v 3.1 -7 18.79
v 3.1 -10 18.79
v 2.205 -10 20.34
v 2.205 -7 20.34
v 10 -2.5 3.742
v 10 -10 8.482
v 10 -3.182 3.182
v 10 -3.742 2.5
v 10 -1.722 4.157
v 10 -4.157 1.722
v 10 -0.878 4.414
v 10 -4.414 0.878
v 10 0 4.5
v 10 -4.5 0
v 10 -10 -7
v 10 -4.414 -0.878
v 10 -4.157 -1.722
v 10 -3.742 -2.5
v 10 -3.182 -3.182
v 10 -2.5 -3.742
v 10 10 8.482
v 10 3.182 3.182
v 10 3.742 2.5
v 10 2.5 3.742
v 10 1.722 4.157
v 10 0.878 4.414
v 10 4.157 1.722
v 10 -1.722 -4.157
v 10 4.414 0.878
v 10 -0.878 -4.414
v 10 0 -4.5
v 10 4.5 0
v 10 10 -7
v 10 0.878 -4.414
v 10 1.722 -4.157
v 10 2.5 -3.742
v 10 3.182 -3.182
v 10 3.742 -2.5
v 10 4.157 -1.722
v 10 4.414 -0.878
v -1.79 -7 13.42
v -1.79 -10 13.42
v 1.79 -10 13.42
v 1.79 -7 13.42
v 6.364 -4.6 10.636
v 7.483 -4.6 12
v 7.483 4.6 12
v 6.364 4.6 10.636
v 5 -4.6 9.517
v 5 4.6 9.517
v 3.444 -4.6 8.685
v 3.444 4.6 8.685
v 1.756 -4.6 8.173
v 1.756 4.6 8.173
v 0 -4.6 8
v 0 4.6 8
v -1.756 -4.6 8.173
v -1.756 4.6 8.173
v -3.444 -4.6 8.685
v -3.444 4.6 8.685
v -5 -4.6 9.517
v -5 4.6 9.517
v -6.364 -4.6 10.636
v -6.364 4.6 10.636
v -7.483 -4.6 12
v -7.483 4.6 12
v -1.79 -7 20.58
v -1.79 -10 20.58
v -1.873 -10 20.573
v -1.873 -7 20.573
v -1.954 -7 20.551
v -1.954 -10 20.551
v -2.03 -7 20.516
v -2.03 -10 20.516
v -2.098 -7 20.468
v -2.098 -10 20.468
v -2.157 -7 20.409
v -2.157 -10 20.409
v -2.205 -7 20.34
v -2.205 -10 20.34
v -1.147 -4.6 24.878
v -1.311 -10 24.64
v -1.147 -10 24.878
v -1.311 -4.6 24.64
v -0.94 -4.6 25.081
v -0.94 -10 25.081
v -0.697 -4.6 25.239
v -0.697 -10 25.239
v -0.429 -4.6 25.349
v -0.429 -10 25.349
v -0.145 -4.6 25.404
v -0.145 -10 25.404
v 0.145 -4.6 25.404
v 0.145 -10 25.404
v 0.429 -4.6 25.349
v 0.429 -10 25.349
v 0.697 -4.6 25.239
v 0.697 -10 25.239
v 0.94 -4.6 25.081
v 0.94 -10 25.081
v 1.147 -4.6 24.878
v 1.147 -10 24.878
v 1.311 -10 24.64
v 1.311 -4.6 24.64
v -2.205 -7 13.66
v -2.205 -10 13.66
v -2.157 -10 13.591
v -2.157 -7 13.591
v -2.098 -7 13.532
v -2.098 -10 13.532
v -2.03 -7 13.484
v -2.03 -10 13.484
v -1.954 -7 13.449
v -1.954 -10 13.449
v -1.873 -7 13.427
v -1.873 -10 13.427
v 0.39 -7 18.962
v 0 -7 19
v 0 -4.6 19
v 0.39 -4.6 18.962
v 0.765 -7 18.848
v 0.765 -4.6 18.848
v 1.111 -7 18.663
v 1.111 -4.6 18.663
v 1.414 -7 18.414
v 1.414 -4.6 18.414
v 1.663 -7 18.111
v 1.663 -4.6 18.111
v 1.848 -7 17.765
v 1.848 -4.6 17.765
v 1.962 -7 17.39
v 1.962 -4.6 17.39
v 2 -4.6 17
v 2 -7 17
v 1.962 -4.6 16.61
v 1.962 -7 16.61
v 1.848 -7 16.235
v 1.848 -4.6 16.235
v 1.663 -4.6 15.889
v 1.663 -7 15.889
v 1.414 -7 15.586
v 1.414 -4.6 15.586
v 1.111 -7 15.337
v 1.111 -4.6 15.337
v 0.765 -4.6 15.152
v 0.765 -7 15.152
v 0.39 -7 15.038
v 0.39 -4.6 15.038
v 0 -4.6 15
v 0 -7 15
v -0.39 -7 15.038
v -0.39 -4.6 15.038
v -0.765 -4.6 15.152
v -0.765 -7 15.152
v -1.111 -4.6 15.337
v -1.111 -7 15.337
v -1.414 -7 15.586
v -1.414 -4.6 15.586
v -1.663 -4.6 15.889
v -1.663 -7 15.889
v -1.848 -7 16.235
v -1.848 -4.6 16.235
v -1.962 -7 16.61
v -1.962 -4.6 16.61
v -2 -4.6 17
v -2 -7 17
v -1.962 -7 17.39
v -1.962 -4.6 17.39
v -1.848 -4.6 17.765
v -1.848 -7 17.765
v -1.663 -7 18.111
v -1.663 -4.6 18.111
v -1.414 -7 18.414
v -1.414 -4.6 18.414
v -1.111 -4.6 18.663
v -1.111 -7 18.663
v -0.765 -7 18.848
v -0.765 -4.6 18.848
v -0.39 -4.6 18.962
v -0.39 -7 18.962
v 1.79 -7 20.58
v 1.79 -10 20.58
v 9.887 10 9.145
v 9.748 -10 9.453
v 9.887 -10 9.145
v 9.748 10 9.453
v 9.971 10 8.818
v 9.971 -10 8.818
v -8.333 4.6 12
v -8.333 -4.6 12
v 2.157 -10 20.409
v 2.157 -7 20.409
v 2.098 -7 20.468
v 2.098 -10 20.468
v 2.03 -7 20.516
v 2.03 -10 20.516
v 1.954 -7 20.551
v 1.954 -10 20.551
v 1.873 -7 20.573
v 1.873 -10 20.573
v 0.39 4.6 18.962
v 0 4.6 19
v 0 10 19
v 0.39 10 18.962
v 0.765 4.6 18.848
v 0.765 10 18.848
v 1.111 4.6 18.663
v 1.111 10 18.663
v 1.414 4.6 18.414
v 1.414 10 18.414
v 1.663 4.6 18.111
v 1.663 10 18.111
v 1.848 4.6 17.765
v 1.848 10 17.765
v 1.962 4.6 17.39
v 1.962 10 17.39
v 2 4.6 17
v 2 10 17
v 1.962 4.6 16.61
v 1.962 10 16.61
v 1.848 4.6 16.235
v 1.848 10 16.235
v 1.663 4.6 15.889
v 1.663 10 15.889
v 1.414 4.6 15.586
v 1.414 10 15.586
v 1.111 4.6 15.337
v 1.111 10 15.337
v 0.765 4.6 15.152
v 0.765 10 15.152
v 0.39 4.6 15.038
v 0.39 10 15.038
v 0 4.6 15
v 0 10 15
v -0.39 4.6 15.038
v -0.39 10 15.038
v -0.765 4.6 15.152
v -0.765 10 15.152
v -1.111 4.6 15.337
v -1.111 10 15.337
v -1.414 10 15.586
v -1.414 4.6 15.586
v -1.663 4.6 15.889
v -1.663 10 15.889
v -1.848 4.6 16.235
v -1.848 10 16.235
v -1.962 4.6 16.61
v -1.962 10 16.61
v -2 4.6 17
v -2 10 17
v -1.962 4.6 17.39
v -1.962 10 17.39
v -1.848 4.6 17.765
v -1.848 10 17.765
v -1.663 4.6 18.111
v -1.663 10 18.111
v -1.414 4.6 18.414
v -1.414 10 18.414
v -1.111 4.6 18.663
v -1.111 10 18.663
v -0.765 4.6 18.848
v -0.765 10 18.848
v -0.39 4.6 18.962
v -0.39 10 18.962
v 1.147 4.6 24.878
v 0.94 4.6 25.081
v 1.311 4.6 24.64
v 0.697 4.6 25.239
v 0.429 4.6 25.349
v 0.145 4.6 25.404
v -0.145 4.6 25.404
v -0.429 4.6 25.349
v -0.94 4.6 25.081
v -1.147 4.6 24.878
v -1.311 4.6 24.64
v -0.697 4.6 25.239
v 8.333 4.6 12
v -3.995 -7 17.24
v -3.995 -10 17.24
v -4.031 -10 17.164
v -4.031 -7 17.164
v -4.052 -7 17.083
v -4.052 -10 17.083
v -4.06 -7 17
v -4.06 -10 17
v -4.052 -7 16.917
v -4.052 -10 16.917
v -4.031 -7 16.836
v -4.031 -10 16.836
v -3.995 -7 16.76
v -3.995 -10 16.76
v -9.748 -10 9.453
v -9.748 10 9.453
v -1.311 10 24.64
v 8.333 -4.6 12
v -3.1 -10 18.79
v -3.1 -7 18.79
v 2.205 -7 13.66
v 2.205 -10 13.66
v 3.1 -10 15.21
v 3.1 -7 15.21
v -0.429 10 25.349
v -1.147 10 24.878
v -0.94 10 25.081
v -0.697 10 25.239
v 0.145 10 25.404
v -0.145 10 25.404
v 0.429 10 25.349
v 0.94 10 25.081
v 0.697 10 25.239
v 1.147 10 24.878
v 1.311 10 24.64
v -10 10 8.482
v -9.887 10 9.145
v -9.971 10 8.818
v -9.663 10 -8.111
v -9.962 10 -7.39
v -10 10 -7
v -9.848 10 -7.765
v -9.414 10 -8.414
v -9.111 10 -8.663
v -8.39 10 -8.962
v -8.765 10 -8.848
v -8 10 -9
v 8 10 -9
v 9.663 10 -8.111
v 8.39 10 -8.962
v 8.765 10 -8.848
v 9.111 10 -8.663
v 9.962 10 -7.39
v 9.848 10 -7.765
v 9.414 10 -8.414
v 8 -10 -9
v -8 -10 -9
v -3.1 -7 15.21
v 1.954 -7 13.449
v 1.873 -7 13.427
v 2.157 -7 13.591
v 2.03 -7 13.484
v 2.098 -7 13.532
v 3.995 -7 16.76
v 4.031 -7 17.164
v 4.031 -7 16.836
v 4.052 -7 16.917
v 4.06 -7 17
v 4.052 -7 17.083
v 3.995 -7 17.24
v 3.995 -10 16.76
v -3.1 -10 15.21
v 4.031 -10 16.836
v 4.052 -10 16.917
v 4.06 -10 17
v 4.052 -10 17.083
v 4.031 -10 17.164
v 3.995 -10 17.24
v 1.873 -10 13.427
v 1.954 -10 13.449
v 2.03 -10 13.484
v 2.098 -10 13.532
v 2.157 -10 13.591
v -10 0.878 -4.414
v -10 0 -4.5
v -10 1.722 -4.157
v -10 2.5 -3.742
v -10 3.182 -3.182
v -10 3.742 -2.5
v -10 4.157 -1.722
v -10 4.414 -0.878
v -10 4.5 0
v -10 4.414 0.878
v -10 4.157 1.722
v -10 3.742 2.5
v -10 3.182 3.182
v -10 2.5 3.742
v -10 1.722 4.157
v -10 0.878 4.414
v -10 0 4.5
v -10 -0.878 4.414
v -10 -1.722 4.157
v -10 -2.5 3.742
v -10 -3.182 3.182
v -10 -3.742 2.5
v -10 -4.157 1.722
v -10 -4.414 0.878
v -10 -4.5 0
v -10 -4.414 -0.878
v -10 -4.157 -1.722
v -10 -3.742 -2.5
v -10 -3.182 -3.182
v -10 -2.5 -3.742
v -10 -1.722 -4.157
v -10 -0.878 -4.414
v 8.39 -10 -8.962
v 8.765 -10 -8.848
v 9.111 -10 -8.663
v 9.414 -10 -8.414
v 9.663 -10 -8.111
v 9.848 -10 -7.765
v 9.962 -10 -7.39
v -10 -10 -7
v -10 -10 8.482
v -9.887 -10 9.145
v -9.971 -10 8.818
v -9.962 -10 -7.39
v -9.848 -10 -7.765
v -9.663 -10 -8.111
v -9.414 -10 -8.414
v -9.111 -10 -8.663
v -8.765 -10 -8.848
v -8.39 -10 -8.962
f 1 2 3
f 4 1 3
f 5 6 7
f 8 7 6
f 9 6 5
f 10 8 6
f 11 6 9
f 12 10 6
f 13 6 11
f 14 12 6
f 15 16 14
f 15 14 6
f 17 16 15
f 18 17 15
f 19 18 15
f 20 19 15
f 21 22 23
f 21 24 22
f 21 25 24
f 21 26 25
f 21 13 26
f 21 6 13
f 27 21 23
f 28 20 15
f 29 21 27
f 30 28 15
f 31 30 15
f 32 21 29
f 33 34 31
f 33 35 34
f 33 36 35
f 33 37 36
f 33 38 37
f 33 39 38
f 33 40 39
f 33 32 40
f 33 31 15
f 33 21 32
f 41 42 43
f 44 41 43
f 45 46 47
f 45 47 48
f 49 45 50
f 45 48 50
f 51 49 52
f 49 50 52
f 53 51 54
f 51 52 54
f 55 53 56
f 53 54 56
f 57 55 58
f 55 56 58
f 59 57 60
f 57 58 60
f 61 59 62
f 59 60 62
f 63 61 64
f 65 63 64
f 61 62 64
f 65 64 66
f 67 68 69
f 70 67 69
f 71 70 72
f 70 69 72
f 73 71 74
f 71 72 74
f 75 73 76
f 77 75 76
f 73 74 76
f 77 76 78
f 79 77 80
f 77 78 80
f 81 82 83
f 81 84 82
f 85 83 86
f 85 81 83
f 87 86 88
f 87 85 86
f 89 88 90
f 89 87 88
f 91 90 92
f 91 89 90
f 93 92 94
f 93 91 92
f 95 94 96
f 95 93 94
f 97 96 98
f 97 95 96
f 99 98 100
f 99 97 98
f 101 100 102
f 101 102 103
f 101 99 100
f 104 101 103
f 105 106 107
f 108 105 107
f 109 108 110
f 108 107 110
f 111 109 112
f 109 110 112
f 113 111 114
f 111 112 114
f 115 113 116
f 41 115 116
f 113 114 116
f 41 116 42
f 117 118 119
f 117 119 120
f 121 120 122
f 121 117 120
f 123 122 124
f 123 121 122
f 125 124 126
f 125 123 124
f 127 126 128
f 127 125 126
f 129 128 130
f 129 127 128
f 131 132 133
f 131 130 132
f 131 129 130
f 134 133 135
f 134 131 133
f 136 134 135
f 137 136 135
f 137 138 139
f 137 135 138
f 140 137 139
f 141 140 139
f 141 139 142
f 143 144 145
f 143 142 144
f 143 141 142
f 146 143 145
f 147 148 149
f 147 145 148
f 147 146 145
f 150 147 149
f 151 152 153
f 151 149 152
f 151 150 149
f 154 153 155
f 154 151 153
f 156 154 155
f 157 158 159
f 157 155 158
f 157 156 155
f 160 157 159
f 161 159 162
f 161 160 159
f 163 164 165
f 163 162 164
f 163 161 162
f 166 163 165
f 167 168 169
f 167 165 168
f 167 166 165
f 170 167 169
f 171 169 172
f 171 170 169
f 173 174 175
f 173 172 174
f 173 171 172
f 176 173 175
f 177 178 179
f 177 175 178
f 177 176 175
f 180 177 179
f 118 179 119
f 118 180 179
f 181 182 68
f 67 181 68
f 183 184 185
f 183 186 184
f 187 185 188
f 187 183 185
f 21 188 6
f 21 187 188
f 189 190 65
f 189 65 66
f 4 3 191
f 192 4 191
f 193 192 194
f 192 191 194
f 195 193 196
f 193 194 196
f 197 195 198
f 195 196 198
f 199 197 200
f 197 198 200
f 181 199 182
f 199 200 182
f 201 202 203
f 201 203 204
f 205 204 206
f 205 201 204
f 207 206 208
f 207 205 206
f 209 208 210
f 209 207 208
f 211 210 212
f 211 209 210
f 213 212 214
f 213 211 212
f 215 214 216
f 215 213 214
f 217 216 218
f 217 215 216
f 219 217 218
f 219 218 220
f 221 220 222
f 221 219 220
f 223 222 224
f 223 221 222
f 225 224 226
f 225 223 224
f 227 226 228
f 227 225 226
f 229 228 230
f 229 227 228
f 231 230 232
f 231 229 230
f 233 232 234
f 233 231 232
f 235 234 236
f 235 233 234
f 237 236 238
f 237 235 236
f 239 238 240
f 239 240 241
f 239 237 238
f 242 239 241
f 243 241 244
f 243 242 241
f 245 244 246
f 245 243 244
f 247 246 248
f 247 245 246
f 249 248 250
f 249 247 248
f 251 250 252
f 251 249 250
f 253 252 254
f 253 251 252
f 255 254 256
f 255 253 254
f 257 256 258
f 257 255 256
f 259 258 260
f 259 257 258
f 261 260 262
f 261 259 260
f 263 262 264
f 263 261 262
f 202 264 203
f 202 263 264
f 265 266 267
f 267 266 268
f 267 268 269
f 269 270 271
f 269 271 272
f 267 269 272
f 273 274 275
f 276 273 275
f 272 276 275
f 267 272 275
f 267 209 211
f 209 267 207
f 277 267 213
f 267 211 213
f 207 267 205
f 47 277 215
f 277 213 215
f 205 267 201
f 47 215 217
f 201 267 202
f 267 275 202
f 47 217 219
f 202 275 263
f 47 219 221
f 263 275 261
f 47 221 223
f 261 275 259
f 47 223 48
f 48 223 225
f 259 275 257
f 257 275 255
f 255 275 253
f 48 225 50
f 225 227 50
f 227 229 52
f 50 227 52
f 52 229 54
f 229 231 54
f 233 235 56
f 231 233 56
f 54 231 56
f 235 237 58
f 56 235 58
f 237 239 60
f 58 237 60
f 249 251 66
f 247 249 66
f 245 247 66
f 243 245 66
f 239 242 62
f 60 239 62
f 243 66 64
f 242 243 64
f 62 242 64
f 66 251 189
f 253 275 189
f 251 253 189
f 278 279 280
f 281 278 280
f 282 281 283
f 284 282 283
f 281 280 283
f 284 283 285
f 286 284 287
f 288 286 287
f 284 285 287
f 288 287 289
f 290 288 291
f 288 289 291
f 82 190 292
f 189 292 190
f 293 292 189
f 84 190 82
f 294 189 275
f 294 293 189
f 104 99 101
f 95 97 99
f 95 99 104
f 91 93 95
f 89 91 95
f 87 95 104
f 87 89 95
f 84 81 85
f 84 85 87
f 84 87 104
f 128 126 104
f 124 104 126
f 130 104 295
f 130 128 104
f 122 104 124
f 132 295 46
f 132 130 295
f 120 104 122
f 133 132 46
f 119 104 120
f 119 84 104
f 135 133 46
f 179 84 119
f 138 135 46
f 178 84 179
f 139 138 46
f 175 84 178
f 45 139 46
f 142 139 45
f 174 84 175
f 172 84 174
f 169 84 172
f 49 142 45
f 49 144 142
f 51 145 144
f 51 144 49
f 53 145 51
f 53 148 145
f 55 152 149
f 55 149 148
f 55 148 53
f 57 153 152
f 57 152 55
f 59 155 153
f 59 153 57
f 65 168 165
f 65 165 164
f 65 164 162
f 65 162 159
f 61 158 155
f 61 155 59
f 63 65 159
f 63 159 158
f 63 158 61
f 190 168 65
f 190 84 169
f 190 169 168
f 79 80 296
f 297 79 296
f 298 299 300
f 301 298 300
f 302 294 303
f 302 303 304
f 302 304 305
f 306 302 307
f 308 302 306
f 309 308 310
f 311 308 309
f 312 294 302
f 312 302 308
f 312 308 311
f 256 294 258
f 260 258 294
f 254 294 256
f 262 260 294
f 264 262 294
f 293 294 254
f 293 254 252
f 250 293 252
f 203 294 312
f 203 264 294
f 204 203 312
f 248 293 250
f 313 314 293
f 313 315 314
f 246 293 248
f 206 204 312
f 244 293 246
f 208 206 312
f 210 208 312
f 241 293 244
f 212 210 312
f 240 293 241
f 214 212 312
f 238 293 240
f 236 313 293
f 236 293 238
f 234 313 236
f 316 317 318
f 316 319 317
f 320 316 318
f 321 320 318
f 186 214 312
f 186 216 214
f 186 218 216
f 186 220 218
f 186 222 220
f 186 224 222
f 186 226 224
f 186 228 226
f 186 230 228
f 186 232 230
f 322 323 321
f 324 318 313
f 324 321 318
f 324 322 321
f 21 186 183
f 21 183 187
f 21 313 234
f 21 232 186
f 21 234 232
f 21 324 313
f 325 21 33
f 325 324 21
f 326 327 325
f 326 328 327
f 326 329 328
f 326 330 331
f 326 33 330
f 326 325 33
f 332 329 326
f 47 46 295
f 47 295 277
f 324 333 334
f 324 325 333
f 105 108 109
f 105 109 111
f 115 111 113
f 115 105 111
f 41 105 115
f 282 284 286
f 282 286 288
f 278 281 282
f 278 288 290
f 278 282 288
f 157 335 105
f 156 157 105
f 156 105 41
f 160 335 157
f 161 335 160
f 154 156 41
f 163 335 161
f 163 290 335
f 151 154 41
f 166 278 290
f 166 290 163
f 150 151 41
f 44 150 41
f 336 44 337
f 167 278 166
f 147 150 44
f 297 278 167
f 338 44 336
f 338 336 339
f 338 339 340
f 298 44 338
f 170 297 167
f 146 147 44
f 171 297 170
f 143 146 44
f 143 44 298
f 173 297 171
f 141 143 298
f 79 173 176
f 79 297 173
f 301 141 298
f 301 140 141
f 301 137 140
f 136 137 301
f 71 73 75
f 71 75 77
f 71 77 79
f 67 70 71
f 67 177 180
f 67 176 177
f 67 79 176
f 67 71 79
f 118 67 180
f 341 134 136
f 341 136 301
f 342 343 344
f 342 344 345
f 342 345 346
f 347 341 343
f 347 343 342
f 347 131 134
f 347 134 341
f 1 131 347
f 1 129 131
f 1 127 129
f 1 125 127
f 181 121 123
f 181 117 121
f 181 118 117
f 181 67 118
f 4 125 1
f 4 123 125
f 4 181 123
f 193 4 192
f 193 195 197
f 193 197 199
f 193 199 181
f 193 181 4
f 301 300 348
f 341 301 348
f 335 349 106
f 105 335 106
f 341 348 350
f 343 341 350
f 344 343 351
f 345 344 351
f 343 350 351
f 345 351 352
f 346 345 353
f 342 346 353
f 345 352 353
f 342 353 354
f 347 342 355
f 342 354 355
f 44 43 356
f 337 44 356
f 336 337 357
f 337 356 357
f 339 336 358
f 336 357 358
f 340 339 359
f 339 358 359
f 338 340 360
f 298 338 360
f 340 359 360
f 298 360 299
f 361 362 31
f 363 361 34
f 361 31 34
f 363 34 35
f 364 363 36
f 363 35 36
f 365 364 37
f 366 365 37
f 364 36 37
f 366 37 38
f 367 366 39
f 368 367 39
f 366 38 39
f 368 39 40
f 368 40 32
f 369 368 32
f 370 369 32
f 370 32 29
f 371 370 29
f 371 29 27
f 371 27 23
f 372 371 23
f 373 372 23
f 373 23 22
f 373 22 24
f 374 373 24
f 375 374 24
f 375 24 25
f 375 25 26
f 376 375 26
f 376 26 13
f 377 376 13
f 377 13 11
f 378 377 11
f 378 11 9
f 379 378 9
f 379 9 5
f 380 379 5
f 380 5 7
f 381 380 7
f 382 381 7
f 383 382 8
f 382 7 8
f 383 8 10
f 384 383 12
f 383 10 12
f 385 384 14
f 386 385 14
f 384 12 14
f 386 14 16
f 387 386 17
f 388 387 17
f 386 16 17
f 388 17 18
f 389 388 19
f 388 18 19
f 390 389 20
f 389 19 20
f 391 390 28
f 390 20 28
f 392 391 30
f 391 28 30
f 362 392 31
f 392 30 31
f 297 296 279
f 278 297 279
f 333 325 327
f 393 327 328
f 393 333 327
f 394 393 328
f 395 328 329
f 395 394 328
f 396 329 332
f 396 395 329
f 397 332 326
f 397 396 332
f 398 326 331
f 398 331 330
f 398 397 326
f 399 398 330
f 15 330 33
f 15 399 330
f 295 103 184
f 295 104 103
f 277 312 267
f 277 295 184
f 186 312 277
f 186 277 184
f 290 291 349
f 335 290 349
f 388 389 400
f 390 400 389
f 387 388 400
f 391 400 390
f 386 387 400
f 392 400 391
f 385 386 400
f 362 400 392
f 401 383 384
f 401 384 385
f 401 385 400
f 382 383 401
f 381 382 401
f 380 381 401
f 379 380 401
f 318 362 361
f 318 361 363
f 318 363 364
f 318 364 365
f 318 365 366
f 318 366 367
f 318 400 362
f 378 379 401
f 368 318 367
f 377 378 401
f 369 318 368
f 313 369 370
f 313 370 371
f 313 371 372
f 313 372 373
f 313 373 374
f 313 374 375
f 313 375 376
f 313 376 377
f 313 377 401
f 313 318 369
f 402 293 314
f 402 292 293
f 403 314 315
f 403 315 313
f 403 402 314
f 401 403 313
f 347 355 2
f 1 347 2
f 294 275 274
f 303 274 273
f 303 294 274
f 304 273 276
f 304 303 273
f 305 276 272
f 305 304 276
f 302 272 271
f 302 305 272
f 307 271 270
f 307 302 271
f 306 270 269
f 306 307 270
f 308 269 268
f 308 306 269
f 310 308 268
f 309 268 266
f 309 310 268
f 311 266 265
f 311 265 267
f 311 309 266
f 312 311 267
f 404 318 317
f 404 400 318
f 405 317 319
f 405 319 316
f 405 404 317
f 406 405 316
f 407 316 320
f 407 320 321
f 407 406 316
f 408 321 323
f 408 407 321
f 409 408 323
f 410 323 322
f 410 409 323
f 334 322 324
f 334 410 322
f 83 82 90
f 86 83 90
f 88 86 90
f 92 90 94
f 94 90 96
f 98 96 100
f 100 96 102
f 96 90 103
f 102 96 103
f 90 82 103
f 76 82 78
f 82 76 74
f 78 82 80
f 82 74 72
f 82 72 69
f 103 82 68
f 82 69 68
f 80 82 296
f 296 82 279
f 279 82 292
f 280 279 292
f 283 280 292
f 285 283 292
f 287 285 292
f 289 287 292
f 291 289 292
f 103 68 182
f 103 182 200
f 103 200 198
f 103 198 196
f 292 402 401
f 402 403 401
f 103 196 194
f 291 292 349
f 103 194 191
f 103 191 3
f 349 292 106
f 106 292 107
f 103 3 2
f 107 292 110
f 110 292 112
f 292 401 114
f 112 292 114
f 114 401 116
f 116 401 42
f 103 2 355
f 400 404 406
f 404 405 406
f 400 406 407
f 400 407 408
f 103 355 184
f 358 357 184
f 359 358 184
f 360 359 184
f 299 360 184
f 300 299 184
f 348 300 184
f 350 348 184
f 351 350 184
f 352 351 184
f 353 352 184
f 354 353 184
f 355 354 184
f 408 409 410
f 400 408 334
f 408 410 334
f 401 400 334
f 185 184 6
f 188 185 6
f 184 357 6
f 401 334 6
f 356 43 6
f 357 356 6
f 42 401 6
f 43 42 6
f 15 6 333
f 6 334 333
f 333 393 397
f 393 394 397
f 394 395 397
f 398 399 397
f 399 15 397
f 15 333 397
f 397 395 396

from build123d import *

# Parameters (mm, degrees)
SKETCH2_R                      = 2
BOSS_EXTRUDE1_DEPTH            = 10
CUT_EXTRUDE2_DEPTH             = 31.479501308
CUT_EXTRUDE2_DEPTH_BACK        = 31.479501308
SKETCH4_W                      = 15
SKETCH4_H                      = 9.2
CUT_EXTRUDE1_REACH             = 37.057
SKETCH3_R                      = 4.5
FILLET3_R                      = 1.5
FILLET4_R                      = 2
CUT_EXTRUDE3_REACH             = 31.082
SKETCH5_R                      = 9
CUT_EXTRUDE3_DIRECTION_2_REACH = 31.082
CUT_EXTRUDE4_DEPTH             = 3


with BuildPart() as part:
    # Sketch2 → Boss-Extrude1 (new, symmetric)
    with BuildSketch(Plane(origin=(0, 0, 0), x_dir=(1, 0, 0), z_dir=(0, 1, 0))):
        Polygon((-10, -9), (0, -27), (10, -9), (10, 9), (-10, 9), align=None)
        with Locations(Location((0, -17, 0), (0, 0, 270))):
            Circle(SKETCH2_R, mode=Mode.SUBTRACT)
    extrude(amount=BOSS_EXTRUDE1_DEPTH, both=True)

    # Sketch4 → Cut-Extrude2 (cut, two sides: drawn at the far end of the back side and taken through both)
    with BuildSketch(Plane(origin=(0, 0, 0), x_dir=(0, 0, -1), z_dir=(1, 0, 0)).offset(-CUT_EXTRUDE2_DEPTH_BACK)):
        with Locations((-19.5, 0)):
            Rectangle(SKETCH4_W, SKETCH4_H)
    extrude(amount=CUT_EXTRUDE2_DEPTH + CUT_EXTRUDE2_DEPTH_BACK, mode=Mode.SUBTRACT)

    # Sketch3 → Cut-Extrude1 (cut, up to next)
    with BuildSketch(Plane(origin=(10, 0, 0), x_dir=(0, 0, -1), z_dir=(1, 0, 0)), mode=Mode.PRIVATE) as cut_extrude1_sk1:
        Circle(SKETCH3_R)
    cut_extrude1_tool1 = extrude(cut_extrude1_sk1.sketch, amount=-CUT_EXTRUDE1_REACH, mode=Mode.PRIVATE) & part.part
    add(cut_extrude1_tool1.solids().sort_by_distance((10, 0, 0))[0], mode=Mode.SUBTRACT)

    # Fillet3
    fillet3_edges = [part.edges().sort_by_distance(p)[0] for p in [
        (0, 7.3, 27),
        (0, -7.3, 27),
    ]]
    fillet(fillet3_edges, radius=FILLET3_R)

    # Fillet4
    fillet4_edges = [part.edges().sort_by_distance(p)[0] for p in [
        (10, 0, 9),
        (-10, 0, 9),
        (-10, 0, -9),
        (10, 0, -9),
    ]]
    fillet(fillet4_edges, radius=FILLET4_R)

    # Cut-Extrude3: up to this face of the body (flat: up to its plane)
    cut_extrude3_end = Plane(part.part.faces().sort_by_distance((-4.635280123, -4.6, 18.215996288))[0])
    # Sketch5 → Cut-Extrude3 (cut, up to the picked face)
    with BuildSketch(Plane(origin=(0, 0, 0), x_dir=(1, 0, 0), z_dir=(0, 1, 0)), mode=Mode.PRIVATE) as cut_extrude3_sk1:
        with Locations((0, -17)):
            Circle(SKETCH5_R)
    cut_extrude3_tool1 = split(extrude(cut_extrude3_sk1.sketch, amount=-CUT_EXTRUDE3_REACH, mode=Mode.PRIVATE), bisect_by=cut_extrude3_end, keep=Keep.BOTH, mode=Mode.PRIVATE)
    add(cut_extrude3_tool1.solids().sort_by(Axis((0, 0, 17), (0, -1, 0)))[0], mode=Mode.SUBTRACT)

    # Cut-Extrude3 direction 2: up to this face of the body (flat: up to its plane)
    cut_extrude3_direction_2_end = Plane(part.part.faces().sort_by_distance((-4.635280123, 4.6, 18.215996288))[0])
    # Sketch5 → Cut-Extrude3 direction 2 (cut, up to the picked face)
    with BuildSketch(Plane(origin=(0, 0, 0), x_dir=(1, 0, 0), z_dir=(0, 1, 0)), mode=Mode.PRIVATE) as cut_extrude3_direction_2_sk1:
        with Locations((0, -17)):
            Circle(SKETCH5_R)
    cut_extrude3_direction_2_tool1 = split(extrude(cut_extrude3_direction_2_sk1.sketch, amount=CUT_EXTRUDE3_DIRECTION_2_REACH, mode=Mode.PRIVATE), bisect_by=cut_extrude3_direction_2_end, keep=Keep.BOTH, mode=Mode.PRIVATE)
    add(cut_extrude3_direction_2_tool1.solids().sort_by(Axis((0, 0, 17), (0, 1, 0)))[0], mode=Mode.SUBTRACT)

    # Sketch8 → Cut-Extrude4 (cut)
    with BuildSketch(Plane.XZ.offset(10)):
        with BuildLine():
            Line((2.205478028, 13.66), (3.100370946, 15.21))
            Line((3.100370946, 15.21), (3.995263863, 16.76))
            ThreePointArc((3.995263863, 16.76), (4.059571669, 17), (3.995263863, 17.24))
            Line((3.995263863, 17.24), (3.100370946, 18.79))
            Line((3.100370946, 18.79), (2.205478028, 20.34))
            ThreePointArc((2.205478028, 20.34), (2.029785834, 20.515692194), (1.789785834, 20.58))
            Line((1.789785834, 20.58), (0, 20.58))
            Line((0, 20.58), (-1.789785834, 20.58))
            ThreePointArc((-1.789785834, 20.58), (-2.029785834, 20.515692194), (-2.205478028, 20.34))
            Line((-2.205478028, 20.34), (-3.100370946, 18.79))
            Line((-3.100370946, 18.79), (-3.995263863, 17.24))
            ThreePointArc((-3.995263863, 17.24), (-4.059571669, 17), (-3.995263863, 16.76))
            Line((-3.995263863, 16.76), (-3.100370946, 15.21))
            Line((-3.100370946, 15.21), (-2.205478028, 13.66))
            ThreePointArc((-2.205478028, 13.66), (-2.029785834, 13.484307806), (-1.789785834, 13.42))
            Line((-1.789785834, 13.42), (0, 13.42))
            Line((0, 13.42), (1.789785834, 13.42))
            ThreePointArc((1.789785834, 13.42), (2.029785834, 13.484307806), (2.205478028, 13.66))
        make_face()
    extrude(amount=-CUT_EXTRUDE4_DEPTH, mode=Mode.SUBTRACT)


solid = part.part
